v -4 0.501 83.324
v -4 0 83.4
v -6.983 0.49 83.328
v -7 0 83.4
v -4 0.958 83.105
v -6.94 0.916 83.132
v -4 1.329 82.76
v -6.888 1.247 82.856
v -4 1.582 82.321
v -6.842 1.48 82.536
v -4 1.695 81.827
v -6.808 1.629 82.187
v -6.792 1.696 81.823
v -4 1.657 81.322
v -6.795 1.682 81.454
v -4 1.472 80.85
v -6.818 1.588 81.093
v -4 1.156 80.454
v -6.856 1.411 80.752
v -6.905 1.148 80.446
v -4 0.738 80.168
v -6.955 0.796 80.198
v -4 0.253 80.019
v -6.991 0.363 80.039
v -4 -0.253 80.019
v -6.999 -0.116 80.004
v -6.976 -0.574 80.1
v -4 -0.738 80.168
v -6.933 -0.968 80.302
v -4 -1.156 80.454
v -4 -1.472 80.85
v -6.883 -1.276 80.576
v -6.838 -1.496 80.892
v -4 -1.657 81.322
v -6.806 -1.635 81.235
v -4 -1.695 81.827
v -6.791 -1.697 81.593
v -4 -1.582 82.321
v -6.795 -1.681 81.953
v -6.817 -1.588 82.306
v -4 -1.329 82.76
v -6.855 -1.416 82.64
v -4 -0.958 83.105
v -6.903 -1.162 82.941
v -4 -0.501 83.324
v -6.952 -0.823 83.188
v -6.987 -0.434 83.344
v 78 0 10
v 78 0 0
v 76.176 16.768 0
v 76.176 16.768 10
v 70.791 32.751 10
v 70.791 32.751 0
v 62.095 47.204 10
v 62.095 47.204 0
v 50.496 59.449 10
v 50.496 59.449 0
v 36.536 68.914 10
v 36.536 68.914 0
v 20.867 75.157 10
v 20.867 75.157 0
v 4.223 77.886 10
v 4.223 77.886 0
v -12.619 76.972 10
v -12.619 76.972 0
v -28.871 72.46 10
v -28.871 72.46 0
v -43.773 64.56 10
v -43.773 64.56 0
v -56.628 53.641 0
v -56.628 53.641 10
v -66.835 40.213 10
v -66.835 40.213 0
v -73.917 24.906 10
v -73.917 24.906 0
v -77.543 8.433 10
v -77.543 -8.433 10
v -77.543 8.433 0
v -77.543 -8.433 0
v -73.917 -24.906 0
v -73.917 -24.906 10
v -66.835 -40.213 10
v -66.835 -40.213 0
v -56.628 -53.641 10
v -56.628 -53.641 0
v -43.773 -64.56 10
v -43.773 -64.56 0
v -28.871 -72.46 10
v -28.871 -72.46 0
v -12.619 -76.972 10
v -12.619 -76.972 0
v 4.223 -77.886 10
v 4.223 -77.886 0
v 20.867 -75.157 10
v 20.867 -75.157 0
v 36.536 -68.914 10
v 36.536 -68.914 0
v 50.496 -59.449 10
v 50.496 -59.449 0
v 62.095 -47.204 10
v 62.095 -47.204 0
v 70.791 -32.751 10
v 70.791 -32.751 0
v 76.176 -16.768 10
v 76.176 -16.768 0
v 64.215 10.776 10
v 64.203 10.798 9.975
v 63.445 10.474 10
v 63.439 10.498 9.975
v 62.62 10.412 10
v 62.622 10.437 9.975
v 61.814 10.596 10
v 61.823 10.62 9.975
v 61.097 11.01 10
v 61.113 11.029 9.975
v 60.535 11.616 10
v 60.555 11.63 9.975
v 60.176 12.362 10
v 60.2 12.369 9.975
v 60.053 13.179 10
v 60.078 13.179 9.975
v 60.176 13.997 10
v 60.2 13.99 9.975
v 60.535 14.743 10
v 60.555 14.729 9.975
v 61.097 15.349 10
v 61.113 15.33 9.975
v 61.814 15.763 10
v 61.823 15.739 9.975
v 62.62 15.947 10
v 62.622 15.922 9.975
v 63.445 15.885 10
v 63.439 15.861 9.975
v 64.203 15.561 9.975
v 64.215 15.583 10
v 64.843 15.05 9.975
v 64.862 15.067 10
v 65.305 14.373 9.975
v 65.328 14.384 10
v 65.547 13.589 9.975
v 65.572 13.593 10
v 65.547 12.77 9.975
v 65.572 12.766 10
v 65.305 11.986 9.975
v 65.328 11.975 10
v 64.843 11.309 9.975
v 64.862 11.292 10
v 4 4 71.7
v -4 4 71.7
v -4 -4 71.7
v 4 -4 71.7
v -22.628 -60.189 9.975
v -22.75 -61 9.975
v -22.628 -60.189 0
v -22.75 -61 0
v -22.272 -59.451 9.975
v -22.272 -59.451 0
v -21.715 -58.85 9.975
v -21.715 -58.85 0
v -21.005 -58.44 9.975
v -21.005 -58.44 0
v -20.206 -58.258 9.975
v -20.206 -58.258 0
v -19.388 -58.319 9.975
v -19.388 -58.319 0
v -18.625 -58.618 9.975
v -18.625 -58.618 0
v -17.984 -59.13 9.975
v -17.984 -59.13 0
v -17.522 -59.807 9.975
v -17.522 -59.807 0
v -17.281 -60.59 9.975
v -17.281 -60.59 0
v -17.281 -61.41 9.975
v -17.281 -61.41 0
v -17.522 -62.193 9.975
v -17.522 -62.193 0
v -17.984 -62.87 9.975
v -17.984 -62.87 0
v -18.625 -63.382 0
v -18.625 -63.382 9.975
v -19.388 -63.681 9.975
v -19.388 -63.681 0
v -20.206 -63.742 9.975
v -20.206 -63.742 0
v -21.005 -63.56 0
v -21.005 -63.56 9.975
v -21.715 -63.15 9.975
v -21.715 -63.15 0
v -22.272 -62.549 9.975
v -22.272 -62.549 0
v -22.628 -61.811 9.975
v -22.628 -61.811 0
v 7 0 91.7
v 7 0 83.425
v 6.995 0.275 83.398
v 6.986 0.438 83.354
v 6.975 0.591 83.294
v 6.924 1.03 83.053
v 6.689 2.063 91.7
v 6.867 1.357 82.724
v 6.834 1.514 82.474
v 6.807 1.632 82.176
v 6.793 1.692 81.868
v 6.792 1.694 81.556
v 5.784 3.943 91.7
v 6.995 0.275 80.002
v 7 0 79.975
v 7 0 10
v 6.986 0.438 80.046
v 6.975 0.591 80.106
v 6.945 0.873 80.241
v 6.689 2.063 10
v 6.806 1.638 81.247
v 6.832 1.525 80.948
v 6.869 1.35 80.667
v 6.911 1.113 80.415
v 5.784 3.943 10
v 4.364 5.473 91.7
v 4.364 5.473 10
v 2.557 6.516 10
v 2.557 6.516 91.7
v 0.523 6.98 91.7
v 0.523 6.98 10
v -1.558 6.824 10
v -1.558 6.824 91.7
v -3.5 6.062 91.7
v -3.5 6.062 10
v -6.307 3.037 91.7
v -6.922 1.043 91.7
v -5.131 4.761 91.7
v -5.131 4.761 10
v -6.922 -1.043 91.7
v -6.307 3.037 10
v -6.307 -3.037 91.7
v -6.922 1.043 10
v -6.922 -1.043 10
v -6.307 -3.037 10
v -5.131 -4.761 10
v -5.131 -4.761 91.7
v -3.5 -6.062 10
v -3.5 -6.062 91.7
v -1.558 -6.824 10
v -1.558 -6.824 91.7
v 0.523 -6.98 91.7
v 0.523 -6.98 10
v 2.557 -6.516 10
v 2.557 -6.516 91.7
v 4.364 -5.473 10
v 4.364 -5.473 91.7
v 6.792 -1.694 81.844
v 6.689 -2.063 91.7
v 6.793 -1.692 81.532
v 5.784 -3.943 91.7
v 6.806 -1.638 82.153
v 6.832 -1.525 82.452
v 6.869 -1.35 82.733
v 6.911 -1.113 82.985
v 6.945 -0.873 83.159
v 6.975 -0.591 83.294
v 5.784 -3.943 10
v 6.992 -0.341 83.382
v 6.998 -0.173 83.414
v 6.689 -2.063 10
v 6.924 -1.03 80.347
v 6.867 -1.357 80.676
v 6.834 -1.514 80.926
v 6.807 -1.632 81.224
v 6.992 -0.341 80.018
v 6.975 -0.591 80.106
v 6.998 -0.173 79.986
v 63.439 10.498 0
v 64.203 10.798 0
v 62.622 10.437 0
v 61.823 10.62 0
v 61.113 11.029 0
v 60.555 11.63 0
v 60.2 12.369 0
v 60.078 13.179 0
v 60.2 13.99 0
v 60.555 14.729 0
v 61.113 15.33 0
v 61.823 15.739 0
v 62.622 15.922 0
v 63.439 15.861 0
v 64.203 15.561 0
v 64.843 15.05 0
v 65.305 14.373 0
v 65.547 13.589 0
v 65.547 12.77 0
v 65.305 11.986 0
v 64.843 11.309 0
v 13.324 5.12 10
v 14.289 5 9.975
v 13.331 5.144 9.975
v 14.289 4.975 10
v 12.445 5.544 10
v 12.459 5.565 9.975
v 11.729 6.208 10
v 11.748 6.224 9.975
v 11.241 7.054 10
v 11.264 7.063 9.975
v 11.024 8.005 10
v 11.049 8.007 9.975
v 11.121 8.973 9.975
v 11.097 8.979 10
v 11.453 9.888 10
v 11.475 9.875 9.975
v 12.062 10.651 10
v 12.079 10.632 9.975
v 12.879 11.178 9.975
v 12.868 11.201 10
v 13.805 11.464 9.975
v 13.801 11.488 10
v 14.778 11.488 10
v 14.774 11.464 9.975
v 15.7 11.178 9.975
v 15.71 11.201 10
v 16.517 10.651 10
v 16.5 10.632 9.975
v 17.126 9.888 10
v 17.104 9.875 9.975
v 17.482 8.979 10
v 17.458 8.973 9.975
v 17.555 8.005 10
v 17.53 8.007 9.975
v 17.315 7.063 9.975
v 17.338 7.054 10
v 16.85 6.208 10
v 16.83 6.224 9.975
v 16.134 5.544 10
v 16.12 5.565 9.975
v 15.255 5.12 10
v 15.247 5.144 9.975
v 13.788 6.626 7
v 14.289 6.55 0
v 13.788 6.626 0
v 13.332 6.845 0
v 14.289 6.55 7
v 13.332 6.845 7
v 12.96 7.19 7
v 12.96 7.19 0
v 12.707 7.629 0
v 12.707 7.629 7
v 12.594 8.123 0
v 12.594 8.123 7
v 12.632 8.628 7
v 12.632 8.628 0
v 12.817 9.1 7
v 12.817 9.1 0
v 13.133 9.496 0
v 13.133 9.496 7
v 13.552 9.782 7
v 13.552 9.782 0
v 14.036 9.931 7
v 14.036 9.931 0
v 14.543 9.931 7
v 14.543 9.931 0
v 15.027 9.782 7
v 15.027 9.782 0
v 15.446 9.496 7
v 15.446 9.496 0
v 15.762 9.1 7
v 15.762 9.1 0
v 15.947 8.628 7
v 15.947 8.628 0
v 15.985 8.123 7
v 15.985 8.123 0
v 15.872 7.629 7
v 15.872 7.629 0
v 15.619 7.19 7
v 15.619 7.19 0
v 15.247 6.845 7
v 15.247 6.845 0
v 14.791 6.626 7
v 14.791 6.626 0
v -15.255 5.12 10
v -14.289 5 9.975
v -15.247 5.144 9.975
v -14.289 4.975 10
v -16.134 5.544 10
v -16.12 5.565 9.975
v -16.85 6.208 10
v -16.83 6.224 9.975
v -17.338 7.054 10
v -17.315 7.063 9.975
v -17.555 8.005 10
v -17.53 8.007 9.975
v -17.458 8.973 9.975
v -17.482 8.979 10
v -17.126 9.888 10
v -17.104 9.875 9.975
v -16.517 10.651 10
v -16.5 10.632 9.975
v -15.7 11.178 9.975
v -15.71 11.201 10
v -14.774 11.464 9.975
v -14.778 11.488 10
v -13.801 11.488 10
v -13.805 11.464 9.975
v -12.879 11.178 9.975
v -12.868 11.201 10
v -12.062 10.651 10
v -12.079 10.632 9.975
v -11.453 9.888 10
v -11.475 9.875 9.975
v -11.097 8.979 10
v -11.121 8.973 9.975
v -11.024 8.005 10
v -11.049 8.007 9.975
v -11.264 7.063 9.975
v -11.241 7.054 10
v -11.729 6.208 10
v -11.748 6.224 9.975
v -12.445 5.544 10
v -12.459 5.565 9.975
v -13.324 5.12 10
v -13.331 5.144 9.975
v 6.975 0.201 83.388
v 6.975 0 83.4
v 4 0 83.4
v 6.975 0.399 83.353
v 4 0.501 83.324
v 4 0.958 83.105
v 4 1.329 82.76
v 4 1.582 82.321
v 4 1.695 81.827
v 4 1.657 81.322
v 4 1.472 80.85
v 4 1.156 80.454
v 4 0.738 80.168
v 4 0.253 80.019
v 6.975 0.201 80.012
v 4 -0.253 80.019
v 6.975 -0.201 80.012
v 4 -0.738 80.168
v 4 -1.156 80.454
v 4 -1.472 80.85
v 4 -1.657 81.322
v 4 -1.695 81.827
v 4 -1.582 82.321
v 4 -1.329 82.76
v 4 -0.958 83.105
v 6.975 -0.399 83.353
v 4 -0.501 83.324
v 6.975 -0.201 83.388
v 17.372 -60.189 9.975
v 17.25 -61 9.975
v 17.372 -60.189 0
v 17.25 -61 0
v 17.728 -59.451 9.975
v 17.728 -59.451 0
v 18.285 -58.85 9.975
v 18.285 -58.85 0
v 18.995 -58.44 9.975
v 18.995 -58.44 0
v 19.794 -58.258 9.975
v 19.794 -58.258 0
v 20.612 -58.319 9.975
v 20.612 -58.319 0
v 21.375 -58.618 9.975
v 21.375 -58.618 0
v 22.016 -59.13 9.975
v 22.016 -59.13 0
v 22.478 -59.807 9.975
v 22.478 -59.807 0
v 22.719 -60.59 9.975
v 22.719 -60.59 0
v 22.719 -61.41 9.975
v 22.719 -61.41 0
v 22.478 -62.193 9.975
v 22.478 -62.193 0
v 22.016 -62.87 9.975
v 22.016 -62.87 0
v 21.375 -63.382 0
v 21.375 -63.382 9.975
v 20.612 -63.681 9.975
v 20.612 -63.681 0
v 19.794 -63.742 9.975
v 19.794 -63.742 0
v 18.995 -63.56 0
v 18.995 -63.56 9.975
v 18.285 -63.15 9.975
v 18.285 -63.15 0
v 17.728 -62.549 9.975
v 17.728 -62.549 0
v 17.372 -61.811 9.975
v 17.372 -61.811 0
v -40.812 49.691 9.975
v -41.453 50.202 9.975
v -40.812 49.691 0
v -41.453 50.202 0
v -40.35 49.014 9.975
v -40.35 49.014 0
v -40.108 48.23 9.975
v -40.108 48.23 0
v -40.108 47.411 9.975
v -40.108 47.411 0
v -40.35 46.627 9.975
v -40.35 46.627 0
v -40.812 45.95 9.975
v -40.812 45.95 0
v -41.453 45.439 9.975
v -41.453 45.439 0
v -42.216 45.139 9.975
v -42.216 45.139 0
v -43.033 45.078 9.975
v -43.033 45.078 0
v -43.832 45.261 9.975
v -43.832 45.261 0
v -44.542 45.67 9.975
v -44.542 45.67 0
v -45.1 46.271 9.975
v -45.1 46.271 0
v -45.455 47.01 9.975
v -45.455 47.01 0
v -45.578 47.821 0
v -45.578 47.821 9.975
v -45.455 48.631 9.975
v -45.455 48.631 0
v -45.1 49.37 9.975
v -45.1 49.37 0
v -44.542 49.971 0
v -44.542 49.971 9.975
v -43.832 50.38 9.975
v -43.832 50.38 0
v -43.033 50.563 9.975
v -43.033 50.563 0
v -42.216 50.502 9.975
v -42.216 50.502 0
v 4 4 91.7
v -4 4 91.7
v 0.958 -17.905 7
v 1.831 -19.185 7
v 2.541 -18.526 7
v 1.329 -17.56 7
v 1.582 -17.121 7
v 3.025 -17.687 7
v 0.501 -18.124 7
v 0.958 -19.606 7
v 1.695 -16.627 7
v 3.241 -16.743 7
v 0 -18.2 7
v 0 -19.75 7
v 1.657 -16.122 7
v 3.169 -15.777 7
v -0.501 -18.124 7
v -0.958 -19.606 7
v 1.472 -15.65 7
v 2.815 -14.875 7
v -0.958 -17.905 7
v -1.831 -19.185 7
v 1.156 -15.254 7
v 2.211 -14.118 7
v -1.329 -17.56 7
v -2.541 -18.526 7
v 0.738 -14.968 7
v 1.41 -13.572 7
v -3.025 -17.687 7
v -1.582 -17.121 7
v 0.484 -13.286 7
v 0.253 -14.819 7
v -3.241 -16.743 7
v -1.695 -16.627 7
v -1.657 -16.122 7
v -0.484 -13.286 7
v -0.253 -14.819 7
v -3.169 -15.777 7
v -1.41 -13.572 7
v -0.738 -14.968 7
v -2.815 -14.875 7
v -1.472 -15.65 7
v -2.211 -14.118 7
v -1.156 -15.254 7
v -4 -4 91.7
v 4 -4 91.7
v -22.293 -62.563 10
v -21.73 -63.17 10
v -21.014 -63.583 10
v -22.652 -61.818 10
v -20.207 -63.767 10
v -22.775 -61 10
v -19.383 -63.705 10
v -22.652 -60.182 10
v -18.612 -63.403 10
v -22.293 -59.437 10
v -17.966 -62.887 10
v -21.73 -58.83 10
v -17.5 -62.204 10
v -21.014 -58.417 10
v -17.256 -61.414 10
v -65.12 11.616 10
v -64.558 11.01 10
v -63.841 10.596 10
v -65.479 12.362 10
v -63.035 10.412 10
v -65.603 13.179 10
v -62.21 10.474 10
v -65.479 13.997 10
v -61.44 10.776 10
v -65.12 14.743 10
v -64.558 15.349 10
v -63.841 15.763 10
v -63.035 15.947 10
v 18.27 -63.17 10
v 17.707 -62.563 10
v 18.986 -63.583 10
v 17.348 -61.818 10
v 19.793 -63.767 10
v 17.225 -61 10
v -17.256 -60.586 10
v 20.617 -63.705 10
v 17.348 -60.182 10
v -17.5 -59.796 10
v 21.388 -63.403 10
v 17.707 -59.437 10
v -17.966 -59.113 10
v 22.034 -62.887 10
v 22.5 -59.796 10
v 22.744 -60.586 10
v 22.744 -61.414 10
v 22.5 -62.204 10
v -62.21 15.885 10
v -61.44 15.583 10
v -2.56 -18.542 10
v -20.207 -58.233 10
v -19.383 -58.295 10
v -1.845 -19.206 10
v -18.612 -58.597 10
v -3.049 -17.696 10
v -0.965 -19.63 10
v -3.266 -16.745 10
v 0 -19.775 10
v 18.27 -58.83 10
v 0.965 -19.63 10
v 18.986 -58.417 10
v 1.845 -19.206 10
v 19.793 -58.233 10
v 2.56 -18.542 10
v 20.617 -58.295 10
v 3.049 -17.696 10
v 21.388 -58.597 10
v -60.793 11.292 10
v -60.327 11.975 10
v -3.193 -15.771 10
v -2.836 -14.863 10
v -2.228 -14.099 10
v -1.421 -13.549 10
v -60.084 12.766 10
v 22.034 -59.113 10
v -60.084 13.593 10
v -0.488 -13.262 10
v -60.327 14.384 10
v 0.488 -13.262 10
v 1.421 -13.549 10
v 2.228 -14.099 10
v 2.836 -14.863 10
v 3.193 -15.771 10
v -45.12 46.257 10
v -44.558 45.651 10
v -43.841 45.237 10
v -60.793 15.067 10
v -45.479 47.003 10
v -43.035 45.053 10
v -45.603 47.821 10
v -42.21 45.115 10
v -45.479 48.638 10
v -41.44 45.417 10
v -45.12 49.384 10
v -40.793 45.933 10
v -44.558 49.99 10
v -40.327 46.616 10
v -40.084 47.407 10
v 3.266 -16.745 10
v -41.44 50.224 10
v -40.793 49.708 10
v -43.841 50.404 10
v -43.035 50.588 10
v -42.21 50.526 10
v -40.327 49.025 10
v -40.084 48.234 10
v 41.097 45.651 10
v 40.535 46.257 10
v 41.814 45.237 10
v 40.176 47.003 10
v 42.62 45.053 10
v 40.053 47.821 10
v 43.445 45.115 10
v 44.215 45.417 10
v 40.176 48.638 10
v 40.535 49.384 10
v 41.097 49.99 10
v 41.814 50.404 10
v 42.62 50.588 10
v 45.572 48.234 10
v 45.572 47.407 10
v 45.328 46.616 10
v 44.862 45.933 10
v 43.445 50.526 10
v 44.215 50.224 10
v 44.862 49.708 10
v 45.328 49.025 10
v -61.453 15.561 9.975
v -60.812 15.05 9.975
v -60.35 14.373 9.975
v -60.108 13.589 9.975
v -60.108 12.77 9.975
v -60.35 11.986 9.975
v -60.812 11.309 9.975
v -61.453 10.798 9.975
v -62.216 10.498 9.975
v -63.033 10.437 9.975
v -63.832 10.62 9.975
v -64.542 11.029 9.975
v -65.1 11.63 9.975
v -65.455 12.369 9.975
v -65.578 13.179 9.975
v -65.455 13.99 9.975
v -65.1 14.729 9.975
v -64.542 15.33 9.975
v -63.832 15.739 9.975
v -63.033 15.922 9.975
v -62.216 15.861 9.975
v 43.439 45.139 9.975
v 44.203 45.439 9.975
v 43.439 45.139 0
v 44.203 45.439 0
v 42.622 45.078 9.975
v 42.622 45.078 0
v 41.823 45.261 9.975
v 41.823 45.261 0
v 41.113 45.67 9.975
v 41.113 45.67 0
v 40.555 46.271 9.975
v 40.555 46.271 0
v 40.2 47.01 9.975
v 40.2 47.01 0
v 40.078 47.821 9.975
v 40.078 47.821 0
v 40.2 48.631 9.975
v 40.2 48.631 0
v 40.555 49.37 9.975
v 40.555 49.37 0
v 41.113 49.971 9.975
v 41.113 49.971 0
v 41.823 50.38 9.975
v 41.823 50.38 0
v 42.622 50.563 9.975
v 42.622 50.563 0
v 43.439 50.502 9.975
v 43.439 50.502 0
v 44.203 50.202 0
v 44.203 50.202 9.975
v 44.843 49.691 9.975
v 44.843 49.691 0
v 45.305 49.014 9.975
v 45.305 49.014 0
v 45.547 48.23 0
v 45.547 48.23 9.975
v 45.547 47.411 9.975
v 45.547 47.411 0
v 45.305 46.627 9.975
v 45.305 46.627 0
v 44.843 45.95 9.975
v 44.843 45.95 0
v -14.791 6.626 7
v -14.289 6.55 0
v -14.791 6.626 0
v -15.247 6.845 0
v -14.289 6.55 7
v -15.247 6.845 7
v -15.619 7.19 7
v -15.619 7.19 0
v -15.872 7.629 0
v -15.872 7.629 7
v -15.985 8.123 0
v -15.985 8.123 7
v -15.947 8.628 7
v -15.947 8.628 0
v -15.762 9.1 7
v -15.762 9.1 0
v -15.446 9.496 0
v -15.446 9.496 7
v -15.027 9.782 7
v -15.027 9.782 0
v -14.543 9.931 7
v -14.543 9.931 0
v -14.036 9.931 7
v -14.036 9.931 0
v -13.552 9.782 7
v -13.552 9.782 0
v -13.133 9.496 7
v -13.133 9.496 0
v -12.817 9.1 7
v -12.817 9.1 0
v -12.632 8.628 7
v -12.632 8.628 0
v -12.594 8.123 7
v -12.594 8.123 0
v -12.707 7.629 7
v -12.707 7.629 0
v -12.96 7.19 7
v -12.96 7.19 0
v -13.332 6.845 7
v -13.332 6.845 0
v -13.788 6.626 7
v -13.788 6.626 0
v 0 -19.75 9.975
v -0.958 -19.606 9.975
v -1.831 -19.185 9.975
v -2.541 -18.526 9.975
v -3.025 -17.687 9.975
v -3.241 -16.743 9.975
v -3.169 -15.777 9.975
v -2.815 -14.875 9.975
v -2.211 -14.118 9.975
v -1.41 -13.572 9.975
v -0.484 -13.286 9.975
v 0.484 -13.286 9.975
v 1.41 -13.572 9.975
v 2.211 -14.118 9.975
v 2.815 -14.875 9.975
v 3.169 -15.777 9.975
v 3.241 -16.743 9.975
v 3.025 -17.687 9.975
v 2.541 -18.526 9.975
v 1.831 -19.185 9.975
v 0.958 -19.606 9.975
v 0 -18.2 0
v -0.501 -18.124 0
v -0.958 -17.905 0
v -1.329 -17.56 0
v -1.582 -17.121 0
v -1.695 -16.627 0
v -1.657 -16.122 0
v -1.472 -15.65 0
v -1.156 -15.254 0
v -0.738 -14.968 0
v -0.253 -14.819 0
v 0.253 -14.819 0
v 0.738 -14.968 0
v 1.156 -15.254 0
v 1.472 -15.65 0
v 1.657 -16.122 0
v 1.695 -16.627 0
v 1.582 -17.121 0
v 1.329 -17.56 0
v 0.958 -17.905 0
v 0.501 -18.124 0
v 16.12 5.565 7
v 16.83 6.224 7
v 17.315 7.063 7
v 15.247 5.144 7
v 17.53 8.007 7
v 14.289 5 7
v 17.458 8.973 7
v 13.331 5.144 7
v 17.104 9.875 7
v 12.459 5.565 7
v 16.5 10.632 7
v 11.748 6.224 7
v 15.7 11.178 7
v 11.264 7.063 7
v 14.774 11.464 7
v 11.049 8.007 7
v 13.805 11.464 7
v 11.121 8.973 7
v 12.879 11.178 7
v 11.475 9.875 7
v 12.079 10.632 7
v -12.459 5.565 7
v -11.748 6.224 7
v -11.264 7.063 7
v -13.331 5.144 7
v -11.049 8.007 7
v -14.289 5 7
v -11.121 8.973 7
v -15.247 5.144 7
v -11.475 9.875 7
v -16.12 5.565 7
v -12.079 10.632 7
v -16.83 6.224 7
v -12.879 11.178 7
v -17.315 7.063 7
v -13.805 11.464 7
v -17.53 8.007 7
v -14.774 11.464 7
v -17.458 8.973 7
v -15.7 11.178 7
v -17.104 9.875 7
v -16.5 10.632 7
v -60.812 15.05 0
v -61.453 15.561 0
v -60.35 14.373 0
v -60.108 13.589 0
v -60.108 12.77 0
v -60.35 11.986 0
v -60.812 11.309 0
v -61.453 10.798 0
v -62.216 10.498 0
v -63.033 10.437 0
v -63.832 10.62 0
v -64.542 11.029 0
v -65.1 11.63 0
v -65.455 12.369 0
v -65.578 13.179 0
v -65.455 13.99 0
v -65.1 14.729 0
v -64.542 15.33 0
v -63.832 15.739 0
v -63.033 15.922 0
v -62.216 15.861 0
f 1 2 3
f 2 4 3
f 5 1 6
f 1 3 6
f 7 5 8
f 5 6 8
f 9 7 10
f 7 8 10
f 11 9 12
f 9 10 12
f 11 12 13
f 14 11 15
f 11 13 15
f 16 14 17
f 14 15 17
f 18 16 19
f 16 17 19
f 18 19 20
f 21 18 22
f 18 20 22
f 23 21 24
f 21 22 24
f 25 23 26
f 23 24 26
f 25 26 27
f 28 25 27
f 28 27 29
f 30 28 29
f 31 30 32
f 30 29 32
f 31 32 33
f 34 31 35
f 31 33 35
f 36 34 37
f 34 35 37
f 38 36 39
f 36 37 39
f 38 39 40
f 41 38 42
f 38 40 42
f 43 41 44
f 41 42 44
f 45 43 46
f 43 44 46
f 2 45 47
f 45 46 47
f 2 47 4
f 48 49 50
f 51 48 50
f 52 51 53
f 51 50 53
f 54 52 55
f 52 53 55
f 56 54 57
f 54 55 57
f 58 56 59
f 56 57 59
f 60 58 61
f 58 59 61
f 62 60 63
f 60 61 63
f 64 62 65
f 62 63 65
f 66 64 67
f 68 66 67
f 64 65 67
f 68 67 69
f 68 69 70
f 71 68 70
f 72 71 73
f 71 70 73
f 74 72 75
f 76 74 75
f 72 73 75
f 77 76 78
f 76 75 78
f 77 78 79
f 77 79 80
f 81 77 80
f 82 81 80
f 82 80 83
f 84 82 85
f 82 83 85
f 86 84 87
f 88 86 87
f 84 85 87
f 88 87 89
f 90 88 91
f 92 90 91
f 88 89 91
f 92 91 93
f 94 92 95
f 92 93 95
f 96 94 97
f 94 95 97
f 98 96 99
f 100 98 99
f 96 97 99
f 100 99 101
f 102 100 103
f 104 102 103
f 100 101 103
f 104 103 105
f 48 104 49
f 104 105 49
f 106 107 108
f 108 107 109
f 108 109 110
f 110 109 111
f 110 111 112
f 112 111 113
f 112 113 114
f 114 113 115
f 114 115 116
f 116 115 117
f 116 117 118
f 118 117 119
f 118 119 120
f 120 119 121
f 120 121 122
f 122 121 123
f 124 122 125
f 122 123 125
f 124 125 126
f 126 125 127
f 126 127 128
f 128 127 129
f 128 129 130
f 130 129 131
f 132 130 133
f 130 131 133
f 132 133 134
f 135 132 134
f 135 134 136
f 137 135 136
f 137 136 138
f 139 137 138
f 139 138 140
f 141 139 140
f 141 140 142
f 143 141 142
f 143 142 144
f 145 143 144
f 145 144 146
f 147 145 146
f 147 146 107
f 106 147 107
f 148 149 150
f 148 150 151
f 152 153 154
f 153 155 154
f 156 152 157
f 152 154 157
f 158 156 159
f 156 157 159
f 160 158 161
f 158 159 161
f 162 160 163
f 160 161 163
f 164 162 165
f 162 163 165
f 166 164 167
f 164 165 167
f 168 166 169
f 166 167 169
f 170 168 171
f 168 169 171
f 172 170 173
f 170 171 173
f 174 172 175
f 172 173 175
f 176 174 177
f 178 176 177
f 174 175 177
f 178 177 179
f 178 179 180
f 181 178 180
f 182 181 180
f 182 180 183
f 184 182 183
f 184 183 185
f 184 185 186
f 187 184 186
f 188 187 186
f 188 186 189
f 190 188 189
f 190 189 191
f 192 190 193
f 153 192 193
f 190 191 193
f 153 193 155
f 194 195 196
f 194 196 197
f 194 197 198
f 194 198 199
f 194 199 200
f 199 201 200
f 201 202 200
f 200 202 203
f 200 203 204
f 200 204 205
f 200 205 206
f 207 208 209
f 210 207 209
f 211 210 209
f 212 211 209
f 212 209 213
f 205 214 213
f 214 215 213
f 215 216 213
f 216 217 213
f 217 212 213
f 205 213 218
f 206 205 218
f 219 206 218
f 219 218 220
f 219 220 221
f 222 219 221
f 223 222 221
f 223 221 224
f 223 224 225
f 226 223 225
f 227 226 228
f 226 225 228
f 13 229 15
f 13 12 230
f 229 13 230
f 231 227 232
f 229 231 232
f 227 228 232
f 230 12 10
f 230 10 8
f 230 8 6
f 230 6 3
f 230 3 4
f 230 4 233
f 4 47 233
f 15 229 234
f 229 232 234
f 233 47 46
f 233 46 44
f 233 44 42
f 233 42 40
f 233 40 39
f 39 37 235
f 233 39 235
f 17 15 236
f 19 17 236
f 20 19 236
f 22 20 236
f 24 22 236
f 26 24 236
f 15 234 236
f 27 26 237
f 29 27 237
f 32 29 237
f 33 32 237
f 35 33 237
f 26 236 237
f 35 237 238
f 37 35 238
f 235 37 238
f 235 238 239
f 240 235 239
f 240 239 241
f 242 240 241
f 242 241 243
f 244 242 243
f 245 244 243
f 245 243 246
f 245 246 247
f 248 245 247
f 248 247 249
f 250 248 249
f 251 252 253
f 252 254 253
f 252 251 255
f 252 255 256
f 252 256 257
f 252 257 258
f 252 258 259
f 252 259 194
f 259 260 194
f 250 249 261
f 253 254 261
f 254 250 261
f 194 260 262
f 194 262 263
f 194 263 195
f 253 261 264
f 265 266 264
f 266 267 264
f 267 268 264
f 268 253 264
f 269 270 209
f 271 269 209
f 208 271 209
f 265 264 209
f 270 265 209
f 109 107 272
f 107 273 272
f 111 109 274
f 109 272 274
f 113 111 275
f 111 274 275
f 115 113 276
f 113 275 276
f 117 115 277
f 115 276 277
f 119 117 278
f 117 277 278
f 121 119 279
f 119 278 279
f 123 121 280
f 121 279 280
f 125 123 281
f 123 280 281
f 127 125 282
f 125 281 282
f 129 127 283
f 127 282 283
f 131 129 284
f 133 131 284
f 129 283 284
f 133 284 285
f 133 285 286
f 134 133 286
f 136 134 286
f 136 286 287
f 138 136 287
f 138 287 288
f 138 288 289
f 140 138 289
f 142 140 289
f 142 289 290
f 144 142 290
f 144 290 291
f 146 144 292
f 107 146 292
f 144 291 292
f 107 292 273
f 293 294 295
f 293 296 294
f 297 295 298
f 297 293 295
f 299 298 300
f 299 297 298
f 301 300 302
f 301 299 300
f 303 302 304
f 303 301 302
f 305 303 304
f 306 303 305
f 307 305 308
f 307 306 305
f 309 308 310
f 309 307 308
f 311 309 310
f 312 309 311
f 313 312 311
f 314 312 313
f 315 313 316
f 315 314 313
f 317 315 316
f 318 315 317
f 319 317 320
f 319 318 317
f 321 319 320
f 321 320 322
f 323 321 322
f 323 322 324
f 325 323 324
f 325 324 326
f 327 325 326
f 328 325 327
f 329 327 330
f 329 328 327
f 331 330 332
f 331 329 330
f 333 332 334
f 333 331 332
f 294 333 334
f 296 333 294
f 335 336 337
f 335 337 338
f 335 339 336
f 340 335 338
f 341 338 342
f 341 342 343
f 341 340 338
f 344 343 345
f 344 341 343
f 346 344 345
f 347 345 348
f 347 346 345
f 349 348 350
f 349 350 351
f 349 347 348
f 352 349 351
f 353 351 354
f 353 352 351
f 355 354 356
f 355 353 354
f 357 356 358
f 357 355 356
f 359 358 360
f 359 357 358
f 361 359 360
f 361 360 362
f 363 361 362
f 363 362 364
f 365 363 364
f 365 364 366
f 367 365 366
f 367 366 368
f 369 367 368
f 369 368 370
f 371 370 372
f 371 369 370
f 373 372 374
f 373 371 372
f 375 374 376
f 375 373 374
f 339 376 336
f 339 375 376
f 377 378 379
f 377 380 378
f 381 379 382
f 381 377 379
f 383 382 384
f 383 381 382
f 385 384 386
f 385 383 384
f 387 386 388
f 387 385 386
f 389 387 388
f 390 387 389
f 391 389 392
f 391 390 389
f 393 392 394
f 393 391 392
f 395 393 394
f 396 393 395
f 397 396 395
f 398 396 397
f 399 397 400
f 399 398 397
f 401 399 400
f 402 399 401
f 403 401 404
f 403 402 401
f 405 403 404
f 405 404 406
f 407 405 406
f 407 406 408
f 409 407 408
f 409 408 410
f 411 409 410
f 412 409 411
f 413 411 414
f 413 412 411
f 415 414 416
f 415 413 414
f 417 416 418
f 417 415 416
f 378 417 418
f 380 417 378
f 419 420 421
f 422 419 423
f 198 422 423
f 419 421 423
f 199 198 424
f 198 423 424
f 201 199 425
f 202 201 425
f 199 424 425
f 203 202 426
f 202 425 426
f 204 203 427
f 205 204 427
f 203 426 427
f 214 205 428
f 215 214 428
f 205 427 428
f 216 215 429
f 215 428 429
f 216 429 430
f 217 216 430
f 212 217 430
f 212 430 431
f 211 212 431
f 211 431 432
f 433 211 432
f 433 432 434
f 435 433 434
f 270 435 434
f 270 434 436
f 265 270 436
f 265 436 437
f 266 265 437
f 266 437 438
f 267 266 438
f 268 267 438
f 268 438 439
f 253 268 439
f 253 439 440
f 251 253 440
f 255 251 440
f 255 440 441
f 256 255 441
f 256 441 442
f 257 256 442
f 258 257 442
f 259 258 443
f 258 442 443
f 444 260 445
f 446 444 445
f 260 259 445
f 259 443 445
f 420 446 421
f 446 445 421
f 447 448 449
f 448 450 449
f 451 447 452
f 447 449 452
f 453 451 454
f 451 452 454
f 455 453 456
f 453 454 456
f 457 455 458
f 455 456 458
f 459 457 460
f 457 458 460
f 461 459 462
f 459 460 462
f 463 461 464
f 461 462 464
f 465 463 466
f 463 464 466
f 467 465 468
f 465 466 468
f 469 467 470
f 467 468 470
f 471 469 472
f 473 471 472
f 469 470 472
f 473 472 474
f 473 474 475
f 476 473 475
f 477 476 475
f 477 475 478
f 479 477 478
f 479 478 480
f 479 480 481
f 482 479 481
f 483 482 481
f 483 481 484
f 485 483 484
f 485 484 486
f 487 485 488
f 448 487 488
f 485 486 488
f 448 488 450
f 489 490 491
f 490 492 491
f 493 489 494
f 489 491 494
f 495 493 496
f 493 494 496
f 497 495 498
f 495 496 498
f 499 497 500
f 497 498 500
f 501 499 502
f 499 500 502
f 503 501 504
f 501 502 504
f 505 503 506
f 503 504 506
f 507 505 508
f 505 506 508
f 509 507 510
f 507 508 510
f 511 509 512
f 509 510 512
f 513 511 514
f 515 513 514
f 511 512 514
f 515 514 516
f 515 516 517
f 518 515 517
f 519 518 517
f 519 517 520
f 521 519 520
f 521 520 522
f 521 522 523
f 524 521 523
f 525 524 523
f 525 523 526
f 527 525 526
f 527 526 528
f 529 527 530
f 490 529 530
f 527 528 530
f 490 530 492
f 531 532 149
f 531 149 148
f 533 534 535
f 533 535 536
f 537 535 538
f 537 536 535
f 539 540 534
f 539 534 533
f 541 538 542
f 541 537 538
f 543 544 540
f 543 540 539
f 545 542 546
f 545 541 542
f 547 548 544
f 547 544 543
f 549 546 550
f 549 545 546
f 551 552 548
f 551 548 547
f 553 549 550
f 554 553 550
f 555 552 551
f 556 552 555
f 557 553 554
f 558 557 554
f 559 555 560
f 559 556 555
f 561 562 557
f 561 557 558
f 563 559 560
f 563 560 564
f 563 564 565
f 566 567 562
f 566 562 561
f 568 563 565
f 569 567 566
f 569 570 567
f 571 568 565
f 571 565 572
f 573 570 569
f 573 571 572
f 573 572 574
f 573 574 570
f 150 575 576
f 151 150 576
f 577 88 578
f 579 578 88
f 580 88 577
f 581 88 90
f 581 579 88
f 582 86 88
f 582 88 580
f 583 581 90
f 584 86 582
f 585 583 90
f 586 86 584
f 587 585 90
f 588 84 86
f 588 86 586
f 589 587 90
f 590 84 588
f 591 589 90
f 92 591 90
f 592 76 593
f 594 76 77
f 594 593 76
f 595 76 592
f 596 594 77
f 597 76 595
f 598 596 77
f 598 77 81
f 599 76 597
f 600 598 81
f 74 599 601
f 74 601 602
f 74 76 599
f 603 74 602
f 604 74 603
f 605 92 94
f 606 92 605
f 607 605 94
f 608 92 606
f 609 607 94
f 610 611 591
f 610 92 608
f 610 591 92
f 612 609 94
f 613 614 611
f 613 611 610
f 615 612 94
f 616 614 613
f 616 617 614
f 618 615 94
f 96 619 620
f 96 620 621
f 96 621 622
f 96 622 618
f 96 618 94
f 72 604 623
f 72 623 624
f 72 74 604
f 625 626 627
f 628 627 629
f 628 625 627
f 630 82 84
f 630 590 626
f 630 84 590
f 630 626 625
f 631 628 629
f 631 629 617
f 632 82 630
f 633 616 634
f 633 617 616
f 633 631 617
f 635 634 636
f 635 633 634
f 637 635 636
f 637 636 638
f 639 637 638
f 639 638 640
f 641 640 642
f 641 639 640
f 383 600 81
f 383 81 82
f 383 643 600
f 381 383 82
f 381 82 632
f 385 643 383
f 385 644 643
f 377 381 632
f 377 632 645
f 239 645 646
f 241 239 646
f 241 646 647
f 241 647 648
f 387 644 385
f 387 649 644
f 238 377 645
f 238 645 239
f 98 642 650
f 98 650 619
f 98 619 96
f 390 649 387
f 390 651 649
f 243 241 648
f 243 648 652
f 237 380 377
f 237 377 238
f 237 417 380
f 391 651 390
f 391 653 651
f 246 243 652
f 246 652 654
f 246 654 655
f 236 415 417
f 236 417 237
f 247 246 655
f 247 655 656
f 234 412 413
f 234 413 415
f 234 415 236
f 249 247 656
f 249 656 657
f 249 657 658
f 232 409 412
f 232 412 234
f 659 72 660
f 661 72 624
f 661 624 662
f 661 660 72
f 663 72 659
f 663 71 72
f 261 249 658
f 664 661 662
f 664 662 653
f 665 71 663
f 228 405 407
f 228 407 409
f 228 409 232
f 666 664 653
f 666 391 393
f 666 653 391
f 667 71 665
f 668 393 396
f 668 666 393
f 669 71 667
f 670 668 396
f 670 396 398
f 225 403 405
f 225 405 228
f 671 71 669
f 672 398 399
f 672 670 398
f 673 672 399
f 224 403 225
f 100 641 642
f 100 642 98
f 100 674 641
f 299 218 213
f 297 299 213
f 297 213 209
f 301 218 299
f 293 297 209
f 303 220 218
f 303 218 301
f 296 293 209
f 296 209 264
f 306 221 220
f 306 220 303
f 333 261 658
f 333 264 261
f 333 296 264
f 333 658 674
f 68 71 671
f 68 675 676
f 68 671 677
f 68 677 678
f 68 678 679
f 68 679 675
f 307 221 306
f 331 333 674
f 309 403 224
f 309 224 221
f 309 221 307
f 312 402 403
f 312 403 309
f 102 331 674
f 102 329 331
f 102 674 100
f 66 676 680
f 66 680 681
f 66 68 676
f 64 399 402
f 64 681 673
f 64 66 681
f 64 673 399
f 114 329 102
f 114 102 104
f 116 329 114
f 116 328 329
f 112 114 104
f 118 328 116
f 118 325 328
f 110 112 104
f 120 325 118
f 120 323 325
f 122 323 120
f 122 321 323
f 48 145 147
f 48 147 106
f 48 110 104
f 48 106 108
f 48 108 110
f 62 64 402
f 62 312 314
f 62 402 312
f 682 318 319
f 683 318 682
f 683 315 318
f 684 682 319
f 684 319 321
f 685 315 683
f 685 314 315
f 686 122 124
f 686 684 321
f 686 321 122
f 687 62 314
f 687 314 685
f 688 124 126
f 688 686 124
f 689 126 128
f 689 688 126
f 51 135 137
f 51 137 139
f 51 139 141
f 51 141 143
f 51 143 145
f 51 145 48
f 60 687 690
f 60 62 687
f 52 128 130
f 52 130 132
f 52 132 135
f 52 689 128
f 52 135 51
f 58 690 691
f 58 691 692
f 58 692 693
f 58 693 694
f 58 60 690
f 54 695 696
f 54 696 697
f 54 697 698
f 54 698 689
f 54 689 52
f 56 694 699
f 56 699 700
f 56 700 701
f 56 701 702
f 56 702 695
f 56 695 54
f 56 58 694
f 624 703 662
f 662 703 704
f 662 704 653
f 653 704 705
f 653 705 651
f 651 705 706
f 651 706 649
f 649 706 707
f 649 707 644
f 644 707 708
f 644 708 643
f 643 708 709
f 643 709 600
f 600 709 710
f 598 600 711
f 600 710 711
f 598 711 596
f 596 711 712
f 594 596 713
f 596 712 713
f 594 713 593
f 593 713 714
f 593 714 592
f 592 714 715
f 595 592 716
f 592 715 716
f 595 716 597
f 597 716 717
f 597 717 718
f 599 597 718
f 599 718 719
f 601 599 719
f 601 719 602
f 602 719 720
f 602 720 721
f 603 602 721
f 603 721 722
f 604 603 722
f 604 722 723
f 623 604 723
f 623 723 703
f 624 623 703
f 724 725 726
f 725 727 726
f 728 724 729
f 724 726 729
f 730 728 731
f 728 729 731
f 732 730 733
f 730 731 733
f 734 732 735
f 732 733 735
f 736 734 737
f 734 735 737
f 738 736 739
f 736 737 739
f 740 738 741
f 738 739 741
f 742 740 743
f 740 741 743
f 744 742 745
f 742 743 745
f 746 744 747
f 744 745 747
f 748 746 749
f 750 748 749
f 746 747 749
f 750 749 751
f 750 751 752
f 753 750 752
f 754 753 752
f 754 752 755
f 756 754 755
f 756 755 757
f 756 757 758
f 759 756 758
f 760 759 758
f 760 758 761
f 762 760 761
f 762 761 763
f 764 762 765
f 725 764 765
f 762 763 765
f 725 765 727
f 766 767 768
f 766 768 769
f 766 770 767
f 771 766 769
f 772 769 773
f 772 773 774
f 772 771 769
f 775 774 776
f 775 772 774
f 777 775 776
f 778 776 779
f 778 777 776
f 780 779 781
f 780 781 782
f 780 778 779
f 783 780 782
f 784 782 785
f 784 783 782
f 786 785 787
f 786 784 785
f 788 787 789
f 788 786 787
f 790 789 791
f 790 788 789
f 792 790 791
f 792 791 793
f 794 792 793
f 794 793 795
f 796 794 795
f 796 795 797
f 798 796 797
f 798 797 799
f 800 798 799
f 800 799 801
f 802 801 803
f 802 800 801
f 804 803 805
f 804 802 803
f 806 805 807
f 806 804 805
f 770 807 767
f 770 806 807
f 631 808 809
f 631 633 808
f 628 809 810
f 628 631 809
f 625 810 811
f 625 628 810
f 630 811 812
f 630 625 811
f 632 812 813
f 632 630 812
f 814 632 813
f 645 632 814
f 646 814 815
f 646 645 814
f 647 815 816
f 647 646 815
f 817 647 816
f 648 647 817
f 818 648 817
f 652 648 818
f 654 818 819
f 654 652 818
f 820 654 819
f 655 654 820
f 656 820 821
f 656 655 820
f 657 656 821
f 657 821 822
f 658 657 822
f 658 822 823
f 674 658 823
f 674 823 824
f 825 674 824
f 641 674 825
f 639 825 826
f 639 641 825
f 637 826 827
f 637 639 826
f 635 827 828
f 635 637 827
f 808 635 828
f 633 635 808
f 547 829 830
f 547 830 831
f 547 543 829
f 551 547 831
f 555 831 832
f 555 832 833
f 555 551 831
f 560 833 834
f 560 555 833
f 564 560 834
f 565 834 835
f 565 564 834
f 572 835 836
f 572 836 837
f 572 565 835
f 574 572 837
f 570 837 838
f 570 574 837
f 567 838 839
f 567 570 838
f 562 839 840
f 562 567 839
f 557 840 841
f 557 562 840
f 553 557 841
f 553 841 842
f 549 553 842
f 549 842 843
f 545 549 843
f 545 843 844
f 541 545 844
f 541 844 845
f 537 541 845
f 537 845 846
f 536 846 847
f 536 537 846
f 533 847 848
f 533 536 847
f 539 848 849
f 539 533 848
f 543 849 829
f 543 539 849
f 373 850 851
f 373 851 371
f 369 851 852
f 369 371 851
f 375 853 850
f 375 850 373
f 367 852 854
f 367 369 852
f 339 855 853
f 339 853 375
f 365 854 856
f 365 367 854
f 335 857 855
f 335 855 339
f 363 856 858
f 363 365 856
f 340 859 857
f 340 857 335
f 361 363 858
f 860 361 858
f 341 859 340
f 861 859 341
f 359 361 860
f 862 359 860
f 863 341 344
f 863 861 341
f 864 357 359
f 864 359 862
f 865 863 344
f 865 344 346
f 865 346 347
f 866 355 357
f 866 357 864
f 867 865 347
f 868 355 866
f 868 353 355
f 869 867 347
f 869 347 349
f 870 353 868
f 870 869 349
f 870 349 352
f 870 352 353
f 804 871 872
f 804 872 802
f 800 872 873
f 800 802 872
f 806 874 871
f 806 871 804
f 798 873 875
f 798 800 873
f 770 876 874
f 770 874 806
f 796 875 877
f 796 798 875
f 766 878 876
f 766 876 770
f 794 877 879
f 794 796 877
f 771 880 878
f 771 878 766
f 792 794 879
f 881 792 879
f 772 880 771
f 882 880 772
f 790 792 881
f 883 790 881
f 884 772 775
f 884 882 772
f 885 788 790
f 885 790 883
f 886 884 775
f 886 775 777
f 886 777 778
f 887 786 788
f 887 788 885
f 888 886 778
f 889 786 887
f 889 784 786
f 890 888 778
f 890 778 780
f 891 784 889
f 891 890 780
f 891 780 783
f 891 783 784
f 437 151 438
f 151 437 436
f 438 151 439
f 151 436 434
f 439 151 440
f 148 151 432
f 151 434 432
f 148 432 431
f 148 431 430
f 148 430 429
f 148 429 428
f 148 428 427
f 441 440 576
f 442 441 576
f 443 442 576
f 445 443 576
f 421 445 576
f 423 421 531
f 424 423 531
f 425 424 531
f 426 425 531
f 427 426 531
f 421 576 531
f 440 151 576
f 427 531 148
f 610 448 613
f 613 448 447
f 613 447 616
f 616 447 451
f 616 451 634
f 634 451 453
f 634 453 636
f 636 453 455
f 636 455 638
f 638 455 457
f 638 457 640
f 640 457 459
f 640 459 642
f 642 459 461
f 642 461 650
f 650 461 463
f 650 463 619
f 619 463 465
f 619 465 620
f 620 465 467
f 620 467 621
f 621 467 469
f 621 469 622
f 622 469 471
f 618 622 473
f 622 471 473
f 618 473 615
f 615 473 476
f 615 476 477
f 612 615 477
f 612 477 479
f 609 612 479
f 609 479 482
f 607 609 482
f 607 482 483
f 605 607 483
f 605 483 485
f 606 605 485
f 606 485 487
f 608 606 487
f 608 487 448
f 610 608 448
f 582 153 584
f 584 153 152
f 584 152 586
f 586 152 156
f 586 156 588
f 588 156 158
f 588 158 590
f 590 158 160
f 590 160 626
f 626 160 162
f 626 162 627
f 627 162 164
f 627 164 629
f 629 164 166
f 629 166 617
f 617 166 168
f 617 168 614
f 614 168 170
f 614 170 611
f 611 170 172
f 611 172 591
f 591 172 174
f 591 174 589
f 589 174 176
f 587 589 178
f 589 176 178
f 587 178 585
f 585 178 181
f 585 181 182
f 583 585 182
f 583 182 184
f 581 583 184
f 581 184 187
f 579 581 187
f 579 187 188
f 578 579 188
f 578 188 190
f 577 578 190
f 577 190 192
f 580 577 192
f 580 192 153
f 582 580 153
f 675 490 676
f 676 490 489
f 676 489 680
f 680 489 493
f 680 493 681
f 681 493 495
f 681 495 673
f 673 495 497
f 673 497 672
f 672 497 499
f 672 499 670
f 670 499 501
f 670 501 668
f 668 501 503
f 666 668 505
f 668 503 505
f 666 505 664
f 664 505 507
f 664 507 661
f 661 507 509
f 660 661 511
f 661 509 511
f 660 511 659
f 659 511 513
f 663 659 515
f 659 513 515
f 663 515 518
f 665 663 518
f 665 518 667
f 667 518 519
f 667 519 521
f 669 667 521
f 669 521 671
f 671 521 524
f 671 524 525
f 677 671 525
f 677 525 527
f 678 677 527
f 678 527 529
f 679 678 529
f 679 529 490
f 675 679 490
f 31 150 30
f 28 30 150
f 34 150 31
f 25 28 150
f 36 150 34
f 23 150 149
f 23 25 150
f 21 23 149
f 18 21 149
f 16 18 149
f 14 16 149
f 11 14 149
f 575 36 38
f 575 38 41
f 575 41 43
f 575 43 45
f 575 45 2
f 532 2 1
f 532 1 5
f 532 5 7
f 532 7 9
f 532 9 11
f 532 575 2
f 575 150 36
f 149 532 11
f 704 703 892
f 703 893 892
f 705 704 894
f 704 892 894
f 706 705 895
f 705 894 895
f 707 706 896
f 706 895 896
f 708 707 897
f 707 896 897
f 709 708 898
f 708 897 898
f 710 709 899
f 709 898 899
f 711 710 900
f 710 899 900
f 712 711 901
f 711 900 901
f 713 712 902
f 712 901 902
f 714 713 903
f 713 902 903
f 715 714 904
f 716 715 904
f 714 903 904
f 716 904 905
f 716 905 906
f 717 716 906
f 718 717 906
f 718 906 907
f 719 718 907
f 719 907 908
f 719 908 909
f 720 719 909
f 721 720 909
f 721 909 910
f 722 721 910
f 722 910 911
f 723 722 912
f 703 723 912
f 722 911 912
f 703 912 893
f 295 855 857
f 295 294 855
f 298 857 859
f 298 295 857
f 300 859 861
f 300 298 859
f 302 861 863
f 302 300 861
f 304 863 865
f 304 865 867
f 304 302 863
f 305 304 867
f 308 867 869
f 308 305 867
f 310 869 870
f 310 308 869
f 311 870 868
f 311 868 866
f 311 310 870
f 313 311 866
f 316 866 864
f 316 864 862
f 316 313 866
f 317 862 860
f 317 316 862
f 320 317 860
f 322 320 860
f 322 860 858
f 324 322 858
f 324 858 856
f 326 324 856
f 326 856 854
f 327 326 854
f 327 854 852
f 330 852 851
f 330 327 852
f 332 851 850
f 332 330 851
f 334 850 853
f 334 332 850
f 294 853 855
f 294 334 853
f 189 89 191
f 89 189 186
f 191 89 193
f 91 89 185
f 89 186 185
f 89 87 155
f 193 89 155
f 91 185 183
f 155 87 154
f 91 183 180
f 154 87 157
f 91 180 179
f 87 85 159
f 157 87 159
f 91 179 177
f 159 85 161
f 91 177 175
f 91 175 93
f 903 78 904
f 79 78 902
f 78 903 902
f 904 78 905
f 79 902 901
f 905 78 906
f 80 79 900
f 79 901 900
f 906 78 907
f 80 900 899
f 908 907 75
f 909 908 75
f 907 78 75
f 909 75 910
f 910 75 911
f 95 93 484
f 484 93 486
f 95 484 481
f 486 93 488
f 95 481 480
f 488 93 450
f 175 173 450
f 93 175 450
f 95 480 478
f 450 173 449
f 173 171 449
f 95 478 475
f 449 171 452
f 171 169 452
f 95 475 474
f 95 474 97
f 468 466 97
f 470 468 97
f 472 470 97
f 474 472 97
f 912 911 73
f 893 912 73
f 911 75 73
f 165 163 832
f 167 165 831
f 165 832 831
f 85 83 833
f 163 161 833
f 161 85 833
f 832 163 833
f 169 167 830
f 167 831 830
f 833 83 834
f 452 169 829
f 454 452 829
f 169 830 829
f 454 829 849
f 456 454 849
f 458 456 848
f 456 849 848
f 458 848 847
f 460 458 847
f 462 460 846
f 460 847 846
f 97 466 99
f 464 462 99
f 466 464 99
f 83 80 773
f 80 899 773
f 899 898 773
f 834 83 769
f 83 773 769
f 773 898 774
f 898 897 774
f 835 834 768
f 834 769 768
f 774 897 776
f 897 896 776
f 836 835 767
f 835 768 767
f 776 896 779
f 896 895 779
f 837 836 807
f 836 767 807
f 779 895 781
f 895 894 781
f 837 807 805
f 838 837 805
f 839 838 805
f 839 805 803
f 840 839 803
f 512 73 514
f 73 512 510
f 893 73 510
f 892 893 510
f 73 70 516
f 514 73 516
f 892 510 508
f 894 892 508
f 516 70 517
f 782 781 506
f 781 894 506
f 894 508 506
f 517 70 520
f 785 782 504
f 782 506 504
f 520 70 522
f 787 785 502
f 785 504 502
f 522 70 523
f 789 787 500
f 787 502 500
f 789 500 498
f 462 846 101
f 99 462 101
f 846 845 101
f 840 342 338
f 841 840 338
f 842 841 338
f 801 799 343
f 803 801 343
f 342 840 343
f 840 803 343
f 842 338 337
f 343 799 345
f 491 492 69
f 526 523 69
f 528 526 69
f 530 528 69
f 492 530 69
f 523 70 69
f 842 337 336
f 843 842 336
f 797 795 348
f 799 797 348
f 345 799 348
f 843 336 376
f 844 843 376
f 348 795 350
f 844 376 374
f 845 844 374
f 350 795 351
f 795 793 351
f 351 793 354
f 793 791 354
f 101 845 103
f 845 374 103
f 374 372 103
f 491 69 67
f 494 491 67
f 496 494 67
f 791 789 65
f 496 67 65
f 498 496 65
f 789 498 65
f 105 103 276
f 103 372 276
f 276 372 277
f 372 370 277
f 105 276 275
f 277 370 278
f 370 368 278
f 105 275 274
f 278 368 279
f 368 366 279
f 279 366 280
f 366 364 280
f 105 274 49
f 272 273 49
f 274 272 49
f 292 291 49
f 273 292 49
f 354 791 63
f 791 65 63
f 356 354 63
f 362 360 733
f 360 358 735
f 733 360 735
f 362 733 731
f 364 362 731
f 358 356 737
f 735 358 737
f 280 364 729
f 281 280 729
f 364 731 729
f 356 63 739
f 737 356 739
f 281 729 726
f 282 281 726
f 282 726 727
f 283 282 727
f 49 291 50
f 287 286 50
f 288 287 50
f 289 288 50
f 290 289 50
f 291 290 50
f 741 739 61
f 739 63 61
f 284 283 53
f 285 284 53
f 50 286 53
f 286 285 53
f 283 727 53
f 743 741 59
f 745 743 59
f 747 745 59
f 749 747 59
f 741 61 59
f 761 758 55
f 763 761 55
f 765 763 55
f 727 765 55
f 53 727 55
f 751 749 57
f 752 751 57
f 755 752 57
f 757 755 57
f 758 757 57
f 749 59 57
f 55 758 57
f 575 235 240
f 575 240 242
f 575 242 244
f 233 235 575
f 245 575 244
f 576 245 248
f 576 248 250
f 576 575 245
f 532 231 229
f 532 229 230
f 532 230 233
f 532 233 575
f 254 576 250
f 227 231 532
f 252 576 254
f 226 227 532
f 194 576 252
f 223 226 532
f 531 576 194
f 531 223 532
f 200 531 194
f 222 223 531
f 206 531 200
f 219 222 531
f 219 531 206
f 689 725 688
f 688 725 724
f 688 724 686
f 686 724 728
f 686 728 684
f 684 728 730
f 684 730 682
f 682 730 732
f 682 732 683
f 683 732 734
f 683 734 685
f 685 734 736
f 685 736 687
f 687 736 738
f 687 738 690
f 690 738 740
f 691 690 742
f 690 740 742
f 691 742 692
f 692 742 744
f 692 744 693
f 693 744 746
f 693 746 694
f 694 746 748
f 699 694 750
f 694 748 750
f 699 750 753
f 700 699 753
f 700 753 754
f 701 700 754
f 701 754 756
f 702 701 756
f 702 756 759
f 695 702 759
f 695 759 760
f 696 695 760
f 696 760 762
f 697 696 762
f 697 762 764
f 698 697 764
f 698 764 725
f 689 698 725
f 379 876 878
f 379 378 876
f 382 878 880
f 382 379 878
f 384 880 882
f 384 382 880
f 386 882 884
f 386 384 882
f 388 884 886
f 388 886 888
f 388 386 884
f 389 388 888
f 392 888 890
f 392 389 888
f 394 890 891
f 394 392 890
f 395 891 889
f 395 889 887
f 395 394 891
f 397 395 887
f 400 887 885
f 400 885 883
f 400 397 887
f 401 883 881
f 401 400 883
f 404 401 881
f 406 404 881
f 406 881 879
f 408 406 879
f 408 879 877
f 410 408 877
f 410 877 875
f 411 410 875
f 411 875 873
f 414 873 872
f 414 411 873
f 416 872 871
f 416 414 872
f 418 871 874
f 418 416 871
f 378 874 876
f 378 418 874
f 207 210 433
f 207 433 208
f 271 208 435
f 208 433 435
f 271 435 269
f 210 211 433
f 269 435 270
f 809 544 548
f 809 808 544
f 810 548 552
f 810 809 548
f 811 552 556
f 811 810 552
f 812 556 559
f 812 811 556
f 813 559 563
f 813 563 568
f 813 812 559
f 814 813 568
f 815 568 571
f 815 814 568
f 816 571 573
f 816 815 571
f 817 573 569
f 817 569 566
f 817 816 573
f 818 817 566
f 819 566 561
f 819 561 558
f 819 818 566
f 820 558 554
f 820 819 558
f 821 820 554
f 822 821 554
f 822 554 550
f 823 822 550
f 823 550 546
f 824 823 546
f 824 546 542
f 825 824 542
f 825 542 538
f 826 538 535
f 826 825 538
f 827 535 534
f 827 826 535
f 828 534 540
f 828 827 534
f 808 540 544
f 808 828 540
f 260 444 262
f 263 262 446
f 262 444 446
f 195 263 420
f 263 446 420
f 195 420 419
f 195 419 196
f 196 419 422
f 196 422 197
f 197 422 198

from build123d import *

# Parameters (mm, degrees)
SKETCH1_R                      = 78
BOSS_EXTRUDE1_DEPTH            = 10
CBORE_FOR_M3_SHCS1_AT_2_COUNT  = 2
CBORE_FOR_M3_SHCS1_AT_2_PITCH  = 28.578838325
CBORE_FOR_M3_SHCS1_AT_3_COUNT  = 2
CBORE_FOR_M3_SHCS1_AT_3_PITCH  = 28.578838325
SKETCH6_R                      = 7
BOSS_EXTRUDE2_DEPTH            = 81.7
SKETCH20_W                     = 8
SKETCH20_H                     = 8
CUT_EXTRUDE1_DEPTH             = 20
M5_CLEARANCE_HOLE3_D           = 5.5
M5_CLEARANCE_HOLE3_CSINK_D     = 5.55
M5_CLEARANCE_HOLE3_CSINK_ANGLE = 90
CIRPATTERN1_COUNT              = 3
M3_CLEARANCE_HOLE2_D           = 3.4
M3_CLEARANCE_HOLE2_CSINK_D     = 3.45
M3_CLEARANCE_HOLE2_CSINK_ANGLE = 90


with BuildPart() as part:
    # Sketch1 → Boss-Extrude1 (new body)
    with BuildSketch(Plane.XY):
        Circle(SKETCH1_R)
    extrude(amount=BOSS_EXTRUDE1_DEPTH)

    # Sketch4 → CBORE for M3 SHCS1 (revolve, cut)
    with BuildSketch(Plane(origin=(-14.289419162, 8.25, 10), x_dir=(0, -1, 0), z_dir=(1, 0, 0))):
        Polygon((0, 0), (0, 10), (1.7, 10), (1.7, 3), (3.25, 3), (3.25, 0.025), (3.275, 0), align=None)
    cbore_for_m3_shcs1 = revolve(axis=Axis((-14.289419162, 8.25, 16.35), (0, 0, -1)), mode=Mode.SUBTRACT)

    # CBORE for M3 SHCS1 at 2: CBORE for M3 SHCS1 ×2
    with Locations(*[(i * CBORE_FOR_M3_SHCS1_AT_2_PITCH, 0, 0) for i in range(1, CBORE_FOR_M3_SHCS1_AT_2_COUNT)]):
        add(cbore_for_m3_shcs1, mode=Mode.SUBTRACT)

    # CBORE for M3 SHCS1 at 3: CBORE for M3 SHCS1 ×2
    with Locations(*[Vector(0.5000000000000012, -0.866025403784438, 0) * (i * CBORE_FOR_M3_SHCS1_AT_3_PITCH) for i in range(1, CBORE_FOR_M3_SHCS1_AT_3_COUNT)]):
        add(cbore_for_m3_shcs1, mode=Mode.SUBTRACT)

    # Sketch6 → Boss-Extrude2 (add)
    with BuildSketch(Plane.XY.offset(10)):
        Circle(SKETCH6_R)
    extrude(amount=BOSS_EXTRUDE2_DEPTH)

    # Sketch20 → Cut-Extrude1 (cut)
    with BuildSketch(Plane.XY.offset(91.7)):
        Rectangle(SKETCH20_W, SKETCH20_H)
    extrude(amount=-CUT_EXTRUDE1_DEPTH, mode=Mode.SUBTRACT)

    # M5 Clearance Hole3 (through all)
    with Locations(Plane.XY.offset(10)):
        with Locations((-20, -61), (20, -61)):
            m5_clearance_hole3 = CounterSinkHole(M5_CLEARANCE_HOLE3_D / 2, M5_CLEARANCE_HOLE3_CSINK_D / 2, counter_sink_angle=M5_CLEARANCE_HOLE3_CSINK_ANGLE)

    # CirPattern1: M5 Clearance Hole3 ×3 about axis
    cirpattern1_axis = Axis((0, 0, 0), (0, 0, 1))
    for i in range(1, CIRPATTERN1_COUNT):
        add(m5_clearance_hole3.rotate(cirpattern1_axis, i * 360 / CIRPATTERN1_COUNT), mode=Mode.SUBTRACT)

    # M3 Clearance Hole2 (through all)
    with Locations(Plane(origin=(7, 0, 0), x_dir=(0, 0, -1), z_dir=(1, 0, 0))):
        with Locations((-81.7, 0)):
            CounterSinkHole(M3_CLEARANCE_HOLE2_D / 2, M3_CLEARANCE_HOLE2_CSINK_D / 2, counter_sink_angle=M3_CLEARANCE_HOLE2_CSINK_ANGLE)


solid = part.part
